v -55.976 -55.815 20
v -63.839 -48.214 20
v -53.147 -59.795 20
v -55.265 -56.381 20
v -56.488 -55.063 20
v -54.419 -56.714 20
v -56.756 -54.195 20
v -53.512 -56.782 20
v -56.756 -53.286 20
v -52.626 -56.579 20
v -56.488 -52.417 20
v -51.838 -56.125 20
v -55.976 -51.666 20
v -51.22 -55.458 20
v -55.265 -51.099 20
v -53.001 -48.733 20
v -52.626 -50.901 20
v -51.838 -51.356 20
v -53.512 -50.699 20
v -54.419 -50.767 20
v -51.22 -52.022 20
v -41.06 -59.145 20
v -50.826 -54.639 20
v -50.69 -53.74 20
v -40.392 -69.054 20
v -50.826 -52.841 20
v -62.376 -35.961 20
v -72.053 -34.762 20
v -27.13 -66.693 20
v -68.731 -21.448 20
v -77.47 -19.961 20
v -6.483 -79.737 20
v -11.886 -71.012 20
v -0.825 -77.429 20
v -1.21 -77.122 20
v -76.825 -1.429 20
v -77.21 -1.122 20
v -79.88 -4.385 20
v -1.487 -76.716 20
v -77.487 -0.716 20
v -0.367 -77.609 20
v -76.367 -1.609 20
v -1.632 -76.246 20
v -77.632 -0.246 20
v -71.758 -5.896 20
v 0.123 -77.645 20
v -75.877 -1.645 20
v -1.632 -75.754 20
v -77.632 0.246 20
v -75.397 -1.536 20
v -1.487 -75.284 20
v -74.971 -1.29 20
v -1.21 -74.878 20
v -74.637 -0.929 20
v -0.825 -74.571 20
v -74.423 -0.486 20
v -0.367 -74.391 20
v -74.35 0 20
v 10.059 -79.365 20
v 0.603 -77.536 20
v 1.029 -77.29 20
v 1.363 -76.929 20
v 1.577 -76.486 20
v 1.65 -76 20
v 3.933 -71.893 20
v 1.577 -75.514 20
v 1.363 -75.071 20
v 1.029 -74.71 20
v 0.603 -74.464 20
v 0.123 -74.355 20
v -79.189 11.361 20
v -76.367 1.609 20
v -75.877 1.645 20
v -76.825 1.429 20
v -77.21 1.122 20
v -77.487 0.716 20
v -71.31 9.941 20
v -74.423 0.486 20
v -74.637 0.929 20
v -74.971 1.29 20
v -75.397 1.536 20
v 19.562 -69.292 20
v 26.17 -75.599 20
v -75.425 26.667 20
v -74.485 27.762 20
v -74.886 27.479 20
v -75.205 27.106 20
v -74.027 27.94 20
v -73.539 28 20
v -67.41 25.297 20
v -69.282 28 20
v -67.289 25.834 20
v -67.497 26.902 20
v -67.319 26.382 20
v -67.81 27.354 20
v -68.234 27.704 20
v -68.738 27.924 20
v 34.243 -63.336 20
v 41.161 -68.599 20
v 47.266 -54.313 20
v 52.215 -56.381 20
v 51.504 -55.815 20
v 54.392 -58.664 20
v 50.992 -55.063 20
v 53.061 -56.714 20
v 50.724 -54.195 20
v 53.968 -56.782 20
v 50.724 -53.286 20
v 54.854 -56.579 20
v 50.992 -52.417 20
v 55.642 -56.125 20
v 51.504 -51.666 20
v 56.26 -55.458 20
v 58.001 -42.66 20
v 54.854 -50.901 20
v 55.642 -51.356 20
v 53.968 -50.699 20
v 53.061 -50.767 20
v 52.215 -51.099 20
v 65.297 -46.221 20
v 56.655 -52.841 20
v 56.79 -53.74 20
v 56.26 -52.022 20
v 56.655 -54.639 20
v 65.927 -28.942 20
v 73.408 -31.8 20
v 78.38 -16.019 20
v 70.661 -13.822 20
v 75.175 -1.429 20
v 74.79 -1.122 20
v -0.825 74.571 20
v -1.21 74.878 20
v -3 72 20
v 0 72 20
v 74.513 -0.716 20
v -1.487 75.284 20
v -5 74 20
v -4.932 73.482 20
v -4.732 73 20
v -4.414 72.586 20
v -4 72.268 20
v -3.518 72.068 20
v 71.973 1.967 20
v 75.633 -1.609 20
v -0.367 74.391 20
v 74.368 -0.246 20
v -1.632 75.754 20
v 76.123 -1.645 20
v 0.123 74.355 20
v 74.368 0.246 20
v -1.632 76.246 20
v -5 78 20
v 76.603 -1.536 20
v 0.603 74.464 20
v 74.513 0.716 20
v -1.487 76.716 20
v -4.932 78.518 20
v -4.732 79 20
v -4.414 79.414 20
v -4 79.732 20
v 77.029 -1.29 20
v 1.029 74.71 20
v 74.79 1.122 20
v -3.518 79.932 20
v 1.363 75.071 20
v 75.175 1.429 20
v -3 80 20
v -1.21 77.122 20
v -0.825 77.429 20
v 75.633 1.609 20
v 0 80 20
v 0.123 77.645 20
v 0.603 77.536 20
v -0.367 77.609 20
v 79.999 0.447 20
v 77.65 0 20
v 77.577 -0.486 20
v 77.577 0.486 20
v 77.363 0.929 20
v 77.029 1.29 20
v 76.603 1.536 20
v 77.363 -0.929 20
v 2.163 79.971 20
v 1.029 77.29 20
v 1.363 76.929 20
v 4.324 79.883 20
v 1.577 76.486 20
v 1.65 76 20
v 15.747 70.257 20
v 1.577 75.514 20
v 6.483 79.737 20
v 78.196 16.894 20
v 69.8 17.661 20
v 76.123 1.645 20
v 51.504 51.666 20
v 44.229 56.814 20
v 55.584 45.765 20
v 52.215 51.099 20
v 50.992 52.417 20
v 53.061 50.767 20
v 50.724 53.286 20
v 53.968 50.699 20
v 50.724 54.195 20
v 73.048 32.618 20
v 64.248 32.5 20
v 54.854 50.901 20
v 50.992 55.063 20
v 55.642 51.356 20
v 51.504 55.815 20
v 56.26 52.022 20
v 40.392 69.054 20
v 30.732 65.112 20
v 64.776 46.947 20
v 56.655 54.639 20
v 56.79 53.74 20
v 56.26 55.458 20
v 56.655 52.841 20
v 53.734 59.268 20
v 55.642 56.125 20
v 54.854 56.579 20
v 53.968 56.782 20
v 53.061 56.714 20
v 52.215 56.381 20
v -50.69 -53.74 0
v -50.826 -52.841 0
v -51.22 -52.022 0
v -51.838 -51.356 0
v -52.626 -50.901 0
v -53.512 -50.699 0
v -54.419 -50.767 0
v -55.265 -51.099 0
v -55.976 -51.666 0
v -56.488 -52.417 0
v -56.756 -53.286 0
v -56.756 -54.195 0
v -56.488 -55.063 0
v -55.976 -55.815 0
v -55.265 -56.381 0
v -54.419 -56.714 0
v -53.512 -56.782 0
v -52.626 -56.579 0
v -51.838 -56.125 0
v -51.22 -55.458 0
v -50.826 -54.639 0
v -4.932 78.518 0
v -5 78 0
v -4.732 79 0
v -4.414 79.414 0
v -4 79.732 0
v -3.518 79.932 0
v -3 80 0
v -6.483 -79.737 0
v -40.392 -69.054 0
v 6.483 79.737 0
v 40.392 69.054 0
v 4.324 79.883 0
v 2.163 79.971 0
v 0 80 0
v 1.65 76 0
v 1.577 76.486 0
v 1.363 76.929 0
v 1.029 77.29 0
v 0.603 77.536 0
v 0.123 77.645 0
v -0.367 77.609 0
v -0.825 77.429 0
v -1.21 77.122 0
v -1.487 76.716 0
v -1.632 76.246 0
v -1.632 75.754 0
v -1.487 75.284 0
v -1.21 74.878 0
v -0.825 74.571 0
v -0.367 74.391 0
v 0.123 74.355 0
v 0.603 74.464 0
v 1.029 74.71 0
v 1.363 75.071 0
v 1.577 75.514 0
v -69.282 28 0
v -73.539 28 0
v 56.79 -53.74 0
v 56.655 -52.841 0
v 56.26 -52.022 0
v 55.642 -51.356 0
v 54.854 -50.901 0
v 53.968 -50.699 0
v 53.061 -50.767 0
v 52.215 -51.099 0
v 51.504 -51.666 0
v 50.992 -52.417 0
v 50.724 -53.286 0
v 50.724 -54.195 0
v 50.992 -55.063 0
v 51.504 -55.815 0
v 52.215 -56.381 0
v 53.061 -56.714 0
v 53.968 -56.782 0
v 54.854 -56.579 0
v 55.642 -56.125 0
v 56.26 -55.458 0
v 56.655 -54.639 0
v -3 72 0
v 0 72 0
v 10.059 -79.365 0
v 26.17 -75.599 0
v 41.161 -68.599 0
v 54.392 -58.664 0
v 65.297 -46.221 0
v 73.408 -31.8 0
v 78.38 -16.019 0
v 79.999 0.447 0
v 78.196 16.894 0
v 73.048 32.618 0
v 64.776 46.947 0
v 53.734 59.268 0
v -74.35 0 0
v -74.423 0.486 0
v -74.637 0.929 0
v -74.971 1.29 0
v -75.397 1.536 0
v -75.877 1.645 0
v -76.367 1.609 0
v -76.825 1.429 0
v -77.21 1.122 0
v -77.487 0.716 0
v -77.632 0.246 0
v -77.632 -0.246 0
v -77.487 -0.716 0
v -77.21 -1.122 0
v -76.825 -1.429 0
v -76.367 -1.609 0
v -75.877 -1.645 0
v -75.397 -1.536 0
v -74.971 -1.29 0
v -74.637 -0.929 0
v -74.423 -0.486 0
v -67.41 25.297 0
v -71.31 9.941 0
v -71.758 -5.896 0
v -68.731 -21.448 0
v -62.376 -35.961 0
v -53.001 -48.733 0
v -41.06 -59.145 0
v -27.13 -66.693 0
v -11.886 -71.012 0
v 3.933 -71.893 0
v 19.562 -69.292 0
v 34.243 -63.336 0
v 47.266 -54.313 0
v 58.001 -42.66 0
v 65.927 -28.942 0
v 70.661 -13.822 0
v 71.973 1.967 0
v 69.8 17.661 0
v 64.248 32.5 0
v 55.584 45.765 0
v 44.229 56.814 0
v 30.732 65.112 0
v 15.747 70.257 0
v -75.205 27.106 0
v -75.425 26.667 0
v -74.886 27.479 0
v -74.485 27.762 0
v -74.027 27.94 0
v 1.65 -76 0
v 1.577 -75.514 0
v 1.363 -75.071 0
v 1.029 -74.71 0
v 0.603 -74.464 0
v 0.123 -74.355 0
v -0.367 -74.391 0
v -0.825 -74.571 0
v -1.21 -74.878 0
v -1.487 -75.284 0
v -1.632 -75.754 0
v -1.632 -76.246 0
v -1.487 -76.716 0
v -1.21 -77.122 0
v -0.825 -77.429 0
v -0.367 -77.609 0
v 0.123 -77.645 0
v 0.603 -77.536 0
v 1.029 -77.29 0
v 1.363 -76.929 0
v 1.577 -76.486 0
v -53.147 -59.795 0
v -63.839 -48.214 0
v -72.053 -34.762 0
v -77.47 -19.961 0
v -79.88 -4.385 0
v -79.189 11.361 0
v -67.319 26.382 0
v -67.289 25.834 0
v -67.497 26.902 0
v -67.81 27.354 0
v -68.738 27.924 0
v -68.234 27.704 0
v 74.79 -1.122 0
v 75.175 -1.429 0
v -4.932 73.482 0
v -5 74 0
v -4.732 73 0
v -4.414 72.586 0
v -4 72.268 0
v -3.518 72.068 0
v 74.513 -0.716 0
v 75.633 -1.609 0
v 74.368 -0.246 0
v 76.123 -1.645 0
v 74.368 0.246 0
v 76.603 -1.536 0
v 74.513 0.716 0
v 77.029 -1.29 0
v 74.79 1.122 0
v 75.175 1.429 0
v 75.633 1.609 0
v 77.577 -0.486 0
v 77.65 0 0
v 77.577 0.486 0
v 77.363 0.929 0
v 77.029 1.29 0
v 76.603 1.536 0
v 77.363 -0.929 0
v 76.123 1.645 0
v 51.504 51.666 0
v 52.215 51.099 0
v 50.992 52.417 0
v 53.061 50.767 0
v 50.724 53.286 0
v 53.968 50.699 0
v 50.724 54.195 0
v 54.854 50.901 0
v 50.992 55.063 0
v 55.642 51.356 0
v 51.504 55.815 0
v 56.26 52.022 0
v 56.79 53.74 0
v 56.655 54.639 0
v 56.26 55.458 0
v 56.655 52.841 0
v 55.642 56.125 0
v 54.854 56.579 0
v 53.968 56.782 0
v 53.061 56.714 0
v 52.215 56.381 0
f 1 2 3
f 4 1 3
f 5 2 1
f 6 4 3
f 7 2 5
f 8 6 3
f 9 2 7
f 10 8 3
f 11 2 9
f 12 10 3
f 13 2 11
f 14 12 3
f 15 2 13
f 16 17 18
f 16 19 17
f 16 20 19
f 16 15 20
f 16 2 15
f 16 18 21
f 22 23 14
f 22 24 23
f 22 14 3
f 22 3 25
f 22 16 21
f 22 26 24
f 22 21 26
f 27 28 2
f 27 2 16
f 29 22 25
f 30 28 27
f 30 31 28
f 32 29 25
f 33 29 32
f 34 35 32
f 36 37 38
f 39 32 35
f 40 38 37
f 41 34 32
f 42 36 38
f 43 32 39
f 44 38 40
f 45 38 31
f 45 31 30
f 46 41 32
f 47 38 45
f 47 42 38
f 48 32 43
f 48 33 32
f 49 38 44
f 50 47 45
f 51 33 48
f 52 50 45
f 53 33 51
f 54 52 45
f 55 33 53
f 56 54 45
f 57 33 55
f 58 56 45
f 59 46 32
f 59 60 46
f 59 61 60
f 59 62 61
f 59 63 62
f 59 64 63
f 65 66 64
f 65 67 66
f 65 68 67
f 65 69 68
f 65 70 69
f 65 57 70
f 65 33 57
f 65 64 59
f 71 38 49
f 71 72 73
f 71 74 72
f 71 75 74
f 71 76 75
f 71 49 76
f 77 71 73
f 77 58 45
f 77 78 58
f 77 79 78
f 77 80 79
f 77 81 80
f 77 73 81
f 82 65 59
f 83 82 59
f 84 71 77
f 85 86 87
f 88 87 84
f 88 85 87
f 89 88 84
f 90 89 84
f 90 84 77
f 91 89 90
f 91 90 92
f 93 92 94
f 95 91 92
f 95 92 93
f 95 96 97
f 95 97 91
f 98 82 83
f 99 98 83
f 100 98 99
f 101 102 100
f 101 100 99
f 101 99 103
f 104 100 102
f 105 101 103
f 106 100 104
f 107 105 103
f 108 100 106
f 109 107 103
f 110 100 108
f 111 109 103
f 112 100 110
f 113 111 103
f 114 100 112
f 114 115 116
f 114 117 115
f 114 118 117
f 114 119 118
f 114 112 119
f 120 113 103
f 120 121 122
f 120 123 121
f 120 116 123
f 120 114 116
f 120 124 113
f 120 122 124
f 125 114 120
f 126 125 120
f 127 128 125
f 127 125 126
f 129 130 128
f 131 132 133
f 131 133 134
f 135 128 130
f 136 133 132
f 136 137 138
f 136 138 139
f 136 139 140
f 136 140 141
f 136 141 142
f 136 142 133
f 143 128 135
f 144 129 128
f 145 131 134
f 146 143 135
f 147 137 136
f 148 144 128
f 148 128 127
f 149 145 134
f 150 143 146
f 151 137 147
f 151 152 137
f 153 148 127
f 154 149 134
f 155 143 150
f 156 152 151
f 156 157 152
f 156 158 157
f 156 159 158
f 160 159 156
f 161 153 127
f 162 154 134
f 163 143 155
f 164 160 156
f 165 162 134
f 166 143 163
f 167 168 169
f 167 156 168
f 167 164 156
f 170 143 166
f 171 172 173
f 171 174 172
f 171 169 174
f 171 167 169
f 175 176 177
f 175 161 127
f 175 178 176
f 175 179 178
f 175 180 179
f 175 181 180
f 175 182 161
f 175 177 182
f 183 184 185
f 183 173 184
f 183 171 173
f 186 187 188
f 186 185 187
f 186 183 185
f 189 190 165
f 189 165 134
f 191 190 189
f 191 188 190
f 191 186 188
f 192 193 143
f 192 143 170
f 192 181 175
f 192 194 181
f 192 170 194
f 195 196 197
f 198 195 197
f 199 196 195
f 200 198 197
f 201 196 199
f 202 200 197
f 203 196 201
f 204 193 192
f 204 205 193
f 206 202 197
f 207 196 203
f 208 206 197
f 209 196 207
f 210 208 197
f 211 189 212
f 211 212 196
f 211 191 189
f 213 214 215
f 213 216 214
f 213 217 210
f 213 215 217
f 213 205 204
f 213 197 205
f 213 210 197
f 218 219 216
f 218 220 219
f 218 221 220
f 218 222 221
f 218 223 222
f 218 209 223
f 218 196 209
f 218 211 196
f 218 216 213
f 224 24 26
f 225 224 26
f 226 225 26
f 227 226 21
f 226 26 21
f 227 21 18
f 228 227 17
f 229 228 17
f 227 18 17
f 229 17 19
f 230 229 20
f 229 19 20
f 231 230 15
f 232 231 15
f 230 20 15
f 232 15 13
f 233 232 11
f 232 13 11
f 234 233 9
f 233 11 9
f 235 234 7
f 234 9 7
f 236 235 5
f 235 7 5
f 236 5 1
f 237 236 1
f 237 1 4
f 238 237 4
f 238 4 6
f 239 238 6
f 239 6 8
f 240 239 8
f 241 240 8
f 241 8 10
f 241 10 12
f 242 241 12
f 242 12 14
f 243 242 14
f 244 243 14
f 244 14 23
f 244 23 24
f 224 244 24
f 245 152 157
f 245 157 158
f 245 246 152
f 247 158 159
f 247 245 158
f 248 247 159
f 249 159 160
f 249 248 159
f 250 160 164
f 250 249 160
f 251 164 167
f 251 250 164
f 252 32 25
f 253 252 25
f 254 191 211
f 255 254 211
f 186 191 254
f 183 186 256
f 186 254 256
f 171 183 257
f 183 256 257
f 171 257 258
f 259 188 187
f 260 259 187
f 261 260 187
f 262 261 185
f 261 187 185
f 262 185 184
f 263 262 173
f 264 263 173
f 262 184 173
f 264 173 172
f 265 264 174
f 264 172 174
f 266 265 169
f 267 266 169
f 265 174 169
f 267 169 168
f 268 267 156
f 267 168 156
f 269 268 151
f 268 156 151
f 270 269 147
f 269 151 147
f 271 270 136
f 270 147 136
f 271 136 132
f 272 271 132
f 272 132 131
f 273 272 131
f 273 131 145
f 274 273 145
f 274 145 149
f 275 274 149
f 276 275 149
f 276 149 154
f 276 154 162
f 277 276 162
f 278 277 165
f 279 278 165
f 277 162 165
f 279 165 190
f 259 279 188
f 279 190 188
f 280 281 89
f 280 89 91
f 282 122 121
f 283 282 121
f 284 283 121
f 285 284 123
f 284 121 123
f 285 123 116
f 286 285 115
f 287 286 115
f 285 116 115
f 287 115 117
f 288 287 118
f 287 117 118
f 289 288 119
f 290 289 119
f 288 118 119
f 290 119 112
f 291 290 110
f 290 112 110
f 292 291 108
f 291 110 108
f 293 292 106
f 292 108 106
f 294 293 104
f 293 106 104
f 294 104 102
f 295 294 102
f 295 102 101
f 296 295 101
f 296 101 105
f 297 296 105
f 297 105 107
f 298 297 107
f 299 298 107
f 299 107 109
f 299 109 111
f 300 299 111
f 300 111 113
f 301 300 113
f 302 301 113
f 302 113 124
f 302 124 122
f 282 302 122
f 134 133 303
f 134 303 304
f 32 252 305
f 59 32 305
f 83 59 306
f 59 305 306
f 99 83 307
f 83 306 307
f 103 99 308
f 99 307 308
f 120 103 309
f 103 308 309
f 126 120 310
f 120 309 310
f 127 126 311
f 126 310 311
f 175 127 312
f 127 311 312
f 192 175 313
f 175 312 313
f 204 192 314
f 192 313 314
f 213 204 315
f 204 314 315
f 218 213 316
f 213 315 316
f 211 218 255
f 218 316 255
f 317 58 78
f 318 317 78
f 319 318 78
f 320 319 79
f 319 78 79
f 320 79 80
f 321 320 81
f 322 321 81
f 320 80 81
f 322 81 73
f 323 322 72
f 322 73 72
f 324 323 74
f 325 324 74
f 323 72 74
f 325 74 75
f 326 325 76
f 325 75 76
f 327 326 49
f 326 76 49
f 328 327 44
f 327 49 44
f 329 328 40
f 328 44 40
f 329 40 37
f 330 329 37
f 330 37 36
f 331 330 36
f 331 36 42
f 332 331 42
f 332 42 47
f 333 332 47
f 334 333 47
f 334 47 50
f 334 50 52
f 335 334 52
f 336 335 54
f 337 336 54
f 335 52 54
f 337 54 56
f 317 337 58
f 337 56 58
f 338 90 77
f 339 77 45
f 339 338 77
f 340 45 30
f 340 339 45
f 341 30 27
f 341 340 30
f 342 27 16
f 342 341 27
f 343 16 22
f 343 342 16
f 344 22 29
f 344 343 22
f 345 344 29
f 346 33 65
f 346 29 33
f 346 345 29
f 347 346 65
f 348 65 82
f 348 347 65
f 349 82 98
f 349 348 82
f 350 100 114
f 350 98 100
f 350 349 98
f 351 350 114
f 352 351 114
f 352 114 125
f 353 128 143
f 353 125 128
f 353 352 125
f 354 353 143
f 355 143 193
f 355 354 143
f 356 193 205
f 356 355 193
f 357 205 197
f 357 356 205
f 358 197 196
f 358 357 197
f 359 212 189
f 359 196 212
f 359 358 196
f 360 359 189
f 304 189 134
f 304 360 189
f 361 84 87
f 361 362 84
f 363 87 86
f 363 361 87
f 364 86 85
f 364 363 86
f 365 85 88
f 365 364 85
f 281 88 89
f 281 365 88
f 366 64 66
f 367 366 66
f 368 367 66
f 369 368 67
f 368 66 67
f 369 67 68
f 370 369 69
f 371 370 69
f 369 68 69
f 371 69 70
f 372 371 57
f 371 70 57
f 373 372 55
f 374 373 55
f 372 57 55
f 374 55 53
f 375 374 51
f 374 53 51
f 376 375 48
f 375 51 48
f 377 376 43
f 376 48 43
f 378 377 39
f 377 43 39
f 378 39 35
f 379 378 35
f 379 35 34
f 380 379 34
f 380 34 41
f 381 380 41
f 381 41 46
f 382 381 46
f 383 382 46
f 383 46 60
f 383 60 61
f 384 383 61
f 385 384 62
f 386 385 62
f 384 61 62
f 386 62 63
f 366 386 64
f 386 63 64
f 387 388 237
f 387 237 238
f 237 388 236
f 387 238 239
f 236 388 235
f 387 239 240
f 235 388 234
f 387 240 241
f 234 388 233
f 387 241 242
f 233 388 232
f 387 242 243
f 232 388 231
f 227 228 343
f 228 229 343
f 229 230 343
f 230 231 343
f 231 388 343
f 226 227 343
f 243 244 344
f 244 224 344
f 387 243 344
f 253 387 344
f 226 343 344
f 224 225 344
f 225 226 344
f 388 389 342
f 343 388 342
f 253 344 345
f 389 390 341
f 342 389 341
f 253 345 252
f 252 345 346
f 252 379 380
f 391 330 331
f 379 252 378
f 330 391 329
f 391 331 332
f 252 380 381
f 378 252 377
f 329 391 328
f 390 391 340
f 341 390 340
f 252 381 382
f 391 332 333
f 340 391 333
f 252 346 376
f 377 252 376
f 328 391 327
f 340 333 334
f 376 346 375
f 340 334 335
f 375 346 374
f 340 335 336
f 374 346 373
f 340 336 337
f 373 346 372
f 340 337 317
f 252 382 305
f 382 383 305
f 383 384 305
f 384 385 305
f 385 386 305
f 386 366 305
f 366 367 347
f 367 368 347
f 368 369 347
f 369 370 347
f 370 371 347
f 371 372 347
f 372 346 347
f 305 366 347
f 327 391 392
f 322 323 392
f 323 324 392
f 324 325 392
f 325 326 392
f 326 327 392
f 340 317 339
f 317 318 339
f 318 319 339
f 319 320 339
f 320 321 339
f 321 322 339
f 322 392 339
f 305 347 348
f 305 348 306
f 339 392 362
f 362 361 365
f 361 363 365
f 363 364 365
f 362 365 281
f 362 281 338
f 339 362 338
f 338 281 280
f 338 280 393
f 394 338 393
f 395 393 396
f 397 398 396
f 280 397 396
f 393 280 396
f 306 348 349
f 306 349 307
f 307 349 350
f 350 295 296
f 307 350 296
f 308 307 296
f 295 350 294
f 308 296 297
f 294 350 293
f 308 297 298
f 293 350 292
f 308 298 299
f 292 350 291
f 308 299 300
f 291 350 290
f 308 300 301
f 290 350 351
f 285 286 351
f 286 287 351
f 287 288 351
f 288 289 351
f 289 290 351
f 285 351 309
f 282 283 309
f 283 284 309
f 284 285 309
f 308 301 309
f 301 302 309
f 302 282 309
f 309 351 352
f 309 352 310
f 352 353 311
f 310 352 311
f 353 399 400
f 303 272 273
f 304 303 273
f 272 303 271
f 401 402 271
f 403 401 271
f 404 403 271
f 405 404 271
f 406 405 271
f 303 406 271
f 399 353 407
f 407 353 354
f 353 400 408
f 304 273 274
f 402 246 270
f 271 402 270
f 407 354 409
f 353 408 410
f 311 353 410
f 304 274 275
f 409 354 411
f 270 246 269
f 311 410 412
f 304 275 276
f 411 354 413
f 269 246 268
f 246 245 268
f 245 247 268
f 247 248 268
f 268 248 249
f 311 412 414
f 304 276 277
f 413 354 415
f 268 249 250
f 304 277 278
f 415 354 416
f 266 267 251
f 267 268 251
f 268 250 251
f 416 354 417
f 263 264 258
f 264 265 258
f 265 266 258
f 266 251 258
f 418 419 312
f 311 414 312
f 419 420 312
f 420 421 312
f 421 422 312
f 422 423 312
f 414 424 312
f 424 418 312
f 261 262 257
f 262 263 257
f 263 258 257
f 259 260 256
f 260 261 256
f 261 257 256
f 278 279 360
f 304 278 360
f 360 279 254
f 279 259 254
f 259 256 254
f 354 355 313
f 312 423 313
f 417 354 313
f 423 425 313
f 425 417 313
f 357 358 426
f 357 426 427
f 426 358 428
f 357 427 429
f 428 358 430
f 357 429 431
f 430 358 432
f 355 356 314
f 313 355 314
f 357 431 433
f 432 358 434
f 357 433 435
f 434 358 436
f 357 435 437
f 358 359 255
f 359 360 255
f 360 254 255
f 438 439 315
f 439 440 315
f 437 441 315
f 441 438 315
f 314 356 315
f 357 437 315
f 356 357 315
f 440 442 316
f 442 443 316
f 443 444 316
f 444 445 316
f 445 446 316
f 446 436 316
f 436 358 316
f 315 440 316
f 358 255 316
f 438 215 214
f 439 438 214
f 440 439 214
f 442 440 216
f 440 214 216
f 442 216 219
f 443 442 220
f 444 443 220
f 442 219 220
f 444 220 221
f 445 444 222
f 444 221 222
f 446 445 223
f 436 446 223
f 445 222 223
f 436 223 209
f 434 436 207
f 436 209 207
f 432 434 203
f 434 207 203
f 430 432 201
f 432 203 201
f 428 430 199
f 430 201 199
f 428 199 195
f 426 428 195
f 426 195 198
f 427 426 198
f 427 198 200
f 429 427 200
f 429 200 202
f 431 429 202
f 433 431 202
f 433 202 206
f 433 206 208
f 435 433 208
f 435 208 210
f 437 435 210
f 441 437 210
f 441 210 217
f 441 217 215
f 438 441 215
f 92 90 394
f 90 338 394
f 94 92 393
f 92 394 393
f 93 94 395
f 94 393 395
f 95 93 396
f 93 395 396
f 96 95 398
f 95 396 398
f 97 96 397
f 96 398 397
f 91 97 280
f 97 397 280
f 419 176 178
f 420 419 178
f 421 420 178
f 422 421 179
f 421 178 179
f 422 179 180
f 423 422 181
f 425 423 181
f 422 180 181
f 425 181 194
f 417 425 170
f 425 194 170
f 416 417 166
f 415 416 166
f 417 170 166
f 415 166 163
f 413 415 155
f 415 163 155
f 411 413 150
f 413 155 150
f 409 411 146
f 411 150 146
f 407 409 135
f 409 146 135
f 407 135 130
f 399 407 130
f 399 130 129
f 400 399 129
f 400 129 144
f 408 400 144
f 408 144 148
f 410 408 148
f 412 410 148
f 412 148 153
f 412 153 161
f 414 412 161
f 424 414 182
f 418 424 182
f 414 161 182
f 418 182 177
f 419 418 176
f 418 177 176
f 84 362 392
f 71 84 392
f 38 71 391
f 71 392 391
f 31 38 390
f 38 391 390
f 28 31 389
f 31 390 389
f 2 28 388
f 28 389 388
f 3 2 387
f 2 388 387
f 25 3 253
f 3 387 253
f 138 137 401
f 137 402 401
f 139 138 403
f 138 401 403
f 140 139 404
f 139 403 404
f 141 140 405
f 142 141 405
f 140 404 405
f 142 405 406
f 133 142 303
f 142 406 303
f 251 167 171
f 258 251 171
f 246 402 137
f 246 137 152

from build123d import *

# Parameters (mm, degrees)
SKETCH_1_R          = 80
SKETCH_1_R_2        = 72
EXTRUDE_1_DEPTH     = 20
SKETCH_2_W          = 88.50052384
SKETCH_2_H          = 52
CUT_EXTRUDE_1_DEPTH = 20
SKETCH_3_W          = 5
SKETCH_3_H          = 8
EXTRUDE_2_DEPTH     = 20
FILLET_1_R          = 2
SKETCH_4_R          = 1.65
CUT_EXTRUDE_2_DEPTH = 20
SKETCH_5_R          = 3.05
CUT_EXTRUDE_3_DEPTH = 30
CUT_EXTRUDE_4_DEPTH = 50


with BuildPart() as part:
    # 草图1 → 凸台-拉伸1 (new body)
    with BuildSketch(Plane.XY):
        Circle(SKETCH_1_R)
        Circle(SKETCH_1_R_2, mode=Mode.SUBTRACT)
    extrude(amount=EXTRUDE_1_DEPTH)

    # 草图2 → 切除-拉伸1 (cut)
    with BuildSketch(Plane.XY.offset(20)):
        with Locations((-44.25026192, 54)):
            Rectangle(SKETCH_2_W, SKETCH_2_H)
    extrude(amount=-CUT_EXTRUDE_1_DEPTH, mode=Mode.SUBTRACT)

    # 草图3 → 凸台-拉伸2 (add)
    with BuildSketch(Plane.XY.offset(20)):
        with Locations((-2.5, 76)):
            Rectangle(SKETCH_3_W, SKETCH_3_H)
    extrude(amount=-EXTRUDE_2_DEPTH)

    # 圆角1
    fillet_1_edges = [part.edges().sort_by_distance(p)[0] for p in [
        (-66.332495807, 28, 10),
        (-74.939975981, 28, 10),
        (-5, 72, 10),
        (-5, 80, 10),
    ]]
    fillet(fillet_1_edges, radius=FILLET_1_R)

    # 草图4 → 切除-拉伸2 (cut)
    with BuildSketch(Plane.XY.offset(20)):
        with Locations((-76, 0)):
            Circle(SKETCH_4_R)
        with Locations((0, -76)):
            Circle(SKETCH_4_R)
        with Locations((76, 0)):
            Circle(SKETCH_4_R)
        with Locations((0, 76)):
            Circle(SKETCH_4_R)
    extrude(amount=-CUT_EXTRUDE_2_DEPTH, mode=Mode.SUBTRACT)

    # 草图5 → 切除-拉伸3 (cut)
    with BuildSketch(Plane.XY.offset(20)):
        with Locations((53.74011537, 53.74011537)):
            Circle(SKETCH_5_R)
        with Locations((53.74011537, -53.74011537)):
            Circle(SKETCH_5_R)
        with Locations((-53.74011537, -53.74011537)):
            Circle(SKETCH_5_R)
    extrude(amount=-CUT_EXTRUDE_3_DEPTH, mode=Mode.SUBTRACT)

    # 草图7 → 切除-拉伸4 (cut)
    with BuildSketch(Plane.XY.offset(20)):
        Polygon((6.869093861, -83.94322558), (-55.146771426, -64.405783947), (-66.191379441, -99.463645444), (-4.175514154, -119.001087078), align=None)
        Polygon((-8.271771426, 84.385124293), (53.744093861, 64.84768266), (64.788701876, 99.905544157), (2.772836589, 119.44298579), align=None)
    extrude(amount=-CUT_EXTRUDE_4_DEPTH, mode=Mode.SUBTRACT)


solid = part.part
